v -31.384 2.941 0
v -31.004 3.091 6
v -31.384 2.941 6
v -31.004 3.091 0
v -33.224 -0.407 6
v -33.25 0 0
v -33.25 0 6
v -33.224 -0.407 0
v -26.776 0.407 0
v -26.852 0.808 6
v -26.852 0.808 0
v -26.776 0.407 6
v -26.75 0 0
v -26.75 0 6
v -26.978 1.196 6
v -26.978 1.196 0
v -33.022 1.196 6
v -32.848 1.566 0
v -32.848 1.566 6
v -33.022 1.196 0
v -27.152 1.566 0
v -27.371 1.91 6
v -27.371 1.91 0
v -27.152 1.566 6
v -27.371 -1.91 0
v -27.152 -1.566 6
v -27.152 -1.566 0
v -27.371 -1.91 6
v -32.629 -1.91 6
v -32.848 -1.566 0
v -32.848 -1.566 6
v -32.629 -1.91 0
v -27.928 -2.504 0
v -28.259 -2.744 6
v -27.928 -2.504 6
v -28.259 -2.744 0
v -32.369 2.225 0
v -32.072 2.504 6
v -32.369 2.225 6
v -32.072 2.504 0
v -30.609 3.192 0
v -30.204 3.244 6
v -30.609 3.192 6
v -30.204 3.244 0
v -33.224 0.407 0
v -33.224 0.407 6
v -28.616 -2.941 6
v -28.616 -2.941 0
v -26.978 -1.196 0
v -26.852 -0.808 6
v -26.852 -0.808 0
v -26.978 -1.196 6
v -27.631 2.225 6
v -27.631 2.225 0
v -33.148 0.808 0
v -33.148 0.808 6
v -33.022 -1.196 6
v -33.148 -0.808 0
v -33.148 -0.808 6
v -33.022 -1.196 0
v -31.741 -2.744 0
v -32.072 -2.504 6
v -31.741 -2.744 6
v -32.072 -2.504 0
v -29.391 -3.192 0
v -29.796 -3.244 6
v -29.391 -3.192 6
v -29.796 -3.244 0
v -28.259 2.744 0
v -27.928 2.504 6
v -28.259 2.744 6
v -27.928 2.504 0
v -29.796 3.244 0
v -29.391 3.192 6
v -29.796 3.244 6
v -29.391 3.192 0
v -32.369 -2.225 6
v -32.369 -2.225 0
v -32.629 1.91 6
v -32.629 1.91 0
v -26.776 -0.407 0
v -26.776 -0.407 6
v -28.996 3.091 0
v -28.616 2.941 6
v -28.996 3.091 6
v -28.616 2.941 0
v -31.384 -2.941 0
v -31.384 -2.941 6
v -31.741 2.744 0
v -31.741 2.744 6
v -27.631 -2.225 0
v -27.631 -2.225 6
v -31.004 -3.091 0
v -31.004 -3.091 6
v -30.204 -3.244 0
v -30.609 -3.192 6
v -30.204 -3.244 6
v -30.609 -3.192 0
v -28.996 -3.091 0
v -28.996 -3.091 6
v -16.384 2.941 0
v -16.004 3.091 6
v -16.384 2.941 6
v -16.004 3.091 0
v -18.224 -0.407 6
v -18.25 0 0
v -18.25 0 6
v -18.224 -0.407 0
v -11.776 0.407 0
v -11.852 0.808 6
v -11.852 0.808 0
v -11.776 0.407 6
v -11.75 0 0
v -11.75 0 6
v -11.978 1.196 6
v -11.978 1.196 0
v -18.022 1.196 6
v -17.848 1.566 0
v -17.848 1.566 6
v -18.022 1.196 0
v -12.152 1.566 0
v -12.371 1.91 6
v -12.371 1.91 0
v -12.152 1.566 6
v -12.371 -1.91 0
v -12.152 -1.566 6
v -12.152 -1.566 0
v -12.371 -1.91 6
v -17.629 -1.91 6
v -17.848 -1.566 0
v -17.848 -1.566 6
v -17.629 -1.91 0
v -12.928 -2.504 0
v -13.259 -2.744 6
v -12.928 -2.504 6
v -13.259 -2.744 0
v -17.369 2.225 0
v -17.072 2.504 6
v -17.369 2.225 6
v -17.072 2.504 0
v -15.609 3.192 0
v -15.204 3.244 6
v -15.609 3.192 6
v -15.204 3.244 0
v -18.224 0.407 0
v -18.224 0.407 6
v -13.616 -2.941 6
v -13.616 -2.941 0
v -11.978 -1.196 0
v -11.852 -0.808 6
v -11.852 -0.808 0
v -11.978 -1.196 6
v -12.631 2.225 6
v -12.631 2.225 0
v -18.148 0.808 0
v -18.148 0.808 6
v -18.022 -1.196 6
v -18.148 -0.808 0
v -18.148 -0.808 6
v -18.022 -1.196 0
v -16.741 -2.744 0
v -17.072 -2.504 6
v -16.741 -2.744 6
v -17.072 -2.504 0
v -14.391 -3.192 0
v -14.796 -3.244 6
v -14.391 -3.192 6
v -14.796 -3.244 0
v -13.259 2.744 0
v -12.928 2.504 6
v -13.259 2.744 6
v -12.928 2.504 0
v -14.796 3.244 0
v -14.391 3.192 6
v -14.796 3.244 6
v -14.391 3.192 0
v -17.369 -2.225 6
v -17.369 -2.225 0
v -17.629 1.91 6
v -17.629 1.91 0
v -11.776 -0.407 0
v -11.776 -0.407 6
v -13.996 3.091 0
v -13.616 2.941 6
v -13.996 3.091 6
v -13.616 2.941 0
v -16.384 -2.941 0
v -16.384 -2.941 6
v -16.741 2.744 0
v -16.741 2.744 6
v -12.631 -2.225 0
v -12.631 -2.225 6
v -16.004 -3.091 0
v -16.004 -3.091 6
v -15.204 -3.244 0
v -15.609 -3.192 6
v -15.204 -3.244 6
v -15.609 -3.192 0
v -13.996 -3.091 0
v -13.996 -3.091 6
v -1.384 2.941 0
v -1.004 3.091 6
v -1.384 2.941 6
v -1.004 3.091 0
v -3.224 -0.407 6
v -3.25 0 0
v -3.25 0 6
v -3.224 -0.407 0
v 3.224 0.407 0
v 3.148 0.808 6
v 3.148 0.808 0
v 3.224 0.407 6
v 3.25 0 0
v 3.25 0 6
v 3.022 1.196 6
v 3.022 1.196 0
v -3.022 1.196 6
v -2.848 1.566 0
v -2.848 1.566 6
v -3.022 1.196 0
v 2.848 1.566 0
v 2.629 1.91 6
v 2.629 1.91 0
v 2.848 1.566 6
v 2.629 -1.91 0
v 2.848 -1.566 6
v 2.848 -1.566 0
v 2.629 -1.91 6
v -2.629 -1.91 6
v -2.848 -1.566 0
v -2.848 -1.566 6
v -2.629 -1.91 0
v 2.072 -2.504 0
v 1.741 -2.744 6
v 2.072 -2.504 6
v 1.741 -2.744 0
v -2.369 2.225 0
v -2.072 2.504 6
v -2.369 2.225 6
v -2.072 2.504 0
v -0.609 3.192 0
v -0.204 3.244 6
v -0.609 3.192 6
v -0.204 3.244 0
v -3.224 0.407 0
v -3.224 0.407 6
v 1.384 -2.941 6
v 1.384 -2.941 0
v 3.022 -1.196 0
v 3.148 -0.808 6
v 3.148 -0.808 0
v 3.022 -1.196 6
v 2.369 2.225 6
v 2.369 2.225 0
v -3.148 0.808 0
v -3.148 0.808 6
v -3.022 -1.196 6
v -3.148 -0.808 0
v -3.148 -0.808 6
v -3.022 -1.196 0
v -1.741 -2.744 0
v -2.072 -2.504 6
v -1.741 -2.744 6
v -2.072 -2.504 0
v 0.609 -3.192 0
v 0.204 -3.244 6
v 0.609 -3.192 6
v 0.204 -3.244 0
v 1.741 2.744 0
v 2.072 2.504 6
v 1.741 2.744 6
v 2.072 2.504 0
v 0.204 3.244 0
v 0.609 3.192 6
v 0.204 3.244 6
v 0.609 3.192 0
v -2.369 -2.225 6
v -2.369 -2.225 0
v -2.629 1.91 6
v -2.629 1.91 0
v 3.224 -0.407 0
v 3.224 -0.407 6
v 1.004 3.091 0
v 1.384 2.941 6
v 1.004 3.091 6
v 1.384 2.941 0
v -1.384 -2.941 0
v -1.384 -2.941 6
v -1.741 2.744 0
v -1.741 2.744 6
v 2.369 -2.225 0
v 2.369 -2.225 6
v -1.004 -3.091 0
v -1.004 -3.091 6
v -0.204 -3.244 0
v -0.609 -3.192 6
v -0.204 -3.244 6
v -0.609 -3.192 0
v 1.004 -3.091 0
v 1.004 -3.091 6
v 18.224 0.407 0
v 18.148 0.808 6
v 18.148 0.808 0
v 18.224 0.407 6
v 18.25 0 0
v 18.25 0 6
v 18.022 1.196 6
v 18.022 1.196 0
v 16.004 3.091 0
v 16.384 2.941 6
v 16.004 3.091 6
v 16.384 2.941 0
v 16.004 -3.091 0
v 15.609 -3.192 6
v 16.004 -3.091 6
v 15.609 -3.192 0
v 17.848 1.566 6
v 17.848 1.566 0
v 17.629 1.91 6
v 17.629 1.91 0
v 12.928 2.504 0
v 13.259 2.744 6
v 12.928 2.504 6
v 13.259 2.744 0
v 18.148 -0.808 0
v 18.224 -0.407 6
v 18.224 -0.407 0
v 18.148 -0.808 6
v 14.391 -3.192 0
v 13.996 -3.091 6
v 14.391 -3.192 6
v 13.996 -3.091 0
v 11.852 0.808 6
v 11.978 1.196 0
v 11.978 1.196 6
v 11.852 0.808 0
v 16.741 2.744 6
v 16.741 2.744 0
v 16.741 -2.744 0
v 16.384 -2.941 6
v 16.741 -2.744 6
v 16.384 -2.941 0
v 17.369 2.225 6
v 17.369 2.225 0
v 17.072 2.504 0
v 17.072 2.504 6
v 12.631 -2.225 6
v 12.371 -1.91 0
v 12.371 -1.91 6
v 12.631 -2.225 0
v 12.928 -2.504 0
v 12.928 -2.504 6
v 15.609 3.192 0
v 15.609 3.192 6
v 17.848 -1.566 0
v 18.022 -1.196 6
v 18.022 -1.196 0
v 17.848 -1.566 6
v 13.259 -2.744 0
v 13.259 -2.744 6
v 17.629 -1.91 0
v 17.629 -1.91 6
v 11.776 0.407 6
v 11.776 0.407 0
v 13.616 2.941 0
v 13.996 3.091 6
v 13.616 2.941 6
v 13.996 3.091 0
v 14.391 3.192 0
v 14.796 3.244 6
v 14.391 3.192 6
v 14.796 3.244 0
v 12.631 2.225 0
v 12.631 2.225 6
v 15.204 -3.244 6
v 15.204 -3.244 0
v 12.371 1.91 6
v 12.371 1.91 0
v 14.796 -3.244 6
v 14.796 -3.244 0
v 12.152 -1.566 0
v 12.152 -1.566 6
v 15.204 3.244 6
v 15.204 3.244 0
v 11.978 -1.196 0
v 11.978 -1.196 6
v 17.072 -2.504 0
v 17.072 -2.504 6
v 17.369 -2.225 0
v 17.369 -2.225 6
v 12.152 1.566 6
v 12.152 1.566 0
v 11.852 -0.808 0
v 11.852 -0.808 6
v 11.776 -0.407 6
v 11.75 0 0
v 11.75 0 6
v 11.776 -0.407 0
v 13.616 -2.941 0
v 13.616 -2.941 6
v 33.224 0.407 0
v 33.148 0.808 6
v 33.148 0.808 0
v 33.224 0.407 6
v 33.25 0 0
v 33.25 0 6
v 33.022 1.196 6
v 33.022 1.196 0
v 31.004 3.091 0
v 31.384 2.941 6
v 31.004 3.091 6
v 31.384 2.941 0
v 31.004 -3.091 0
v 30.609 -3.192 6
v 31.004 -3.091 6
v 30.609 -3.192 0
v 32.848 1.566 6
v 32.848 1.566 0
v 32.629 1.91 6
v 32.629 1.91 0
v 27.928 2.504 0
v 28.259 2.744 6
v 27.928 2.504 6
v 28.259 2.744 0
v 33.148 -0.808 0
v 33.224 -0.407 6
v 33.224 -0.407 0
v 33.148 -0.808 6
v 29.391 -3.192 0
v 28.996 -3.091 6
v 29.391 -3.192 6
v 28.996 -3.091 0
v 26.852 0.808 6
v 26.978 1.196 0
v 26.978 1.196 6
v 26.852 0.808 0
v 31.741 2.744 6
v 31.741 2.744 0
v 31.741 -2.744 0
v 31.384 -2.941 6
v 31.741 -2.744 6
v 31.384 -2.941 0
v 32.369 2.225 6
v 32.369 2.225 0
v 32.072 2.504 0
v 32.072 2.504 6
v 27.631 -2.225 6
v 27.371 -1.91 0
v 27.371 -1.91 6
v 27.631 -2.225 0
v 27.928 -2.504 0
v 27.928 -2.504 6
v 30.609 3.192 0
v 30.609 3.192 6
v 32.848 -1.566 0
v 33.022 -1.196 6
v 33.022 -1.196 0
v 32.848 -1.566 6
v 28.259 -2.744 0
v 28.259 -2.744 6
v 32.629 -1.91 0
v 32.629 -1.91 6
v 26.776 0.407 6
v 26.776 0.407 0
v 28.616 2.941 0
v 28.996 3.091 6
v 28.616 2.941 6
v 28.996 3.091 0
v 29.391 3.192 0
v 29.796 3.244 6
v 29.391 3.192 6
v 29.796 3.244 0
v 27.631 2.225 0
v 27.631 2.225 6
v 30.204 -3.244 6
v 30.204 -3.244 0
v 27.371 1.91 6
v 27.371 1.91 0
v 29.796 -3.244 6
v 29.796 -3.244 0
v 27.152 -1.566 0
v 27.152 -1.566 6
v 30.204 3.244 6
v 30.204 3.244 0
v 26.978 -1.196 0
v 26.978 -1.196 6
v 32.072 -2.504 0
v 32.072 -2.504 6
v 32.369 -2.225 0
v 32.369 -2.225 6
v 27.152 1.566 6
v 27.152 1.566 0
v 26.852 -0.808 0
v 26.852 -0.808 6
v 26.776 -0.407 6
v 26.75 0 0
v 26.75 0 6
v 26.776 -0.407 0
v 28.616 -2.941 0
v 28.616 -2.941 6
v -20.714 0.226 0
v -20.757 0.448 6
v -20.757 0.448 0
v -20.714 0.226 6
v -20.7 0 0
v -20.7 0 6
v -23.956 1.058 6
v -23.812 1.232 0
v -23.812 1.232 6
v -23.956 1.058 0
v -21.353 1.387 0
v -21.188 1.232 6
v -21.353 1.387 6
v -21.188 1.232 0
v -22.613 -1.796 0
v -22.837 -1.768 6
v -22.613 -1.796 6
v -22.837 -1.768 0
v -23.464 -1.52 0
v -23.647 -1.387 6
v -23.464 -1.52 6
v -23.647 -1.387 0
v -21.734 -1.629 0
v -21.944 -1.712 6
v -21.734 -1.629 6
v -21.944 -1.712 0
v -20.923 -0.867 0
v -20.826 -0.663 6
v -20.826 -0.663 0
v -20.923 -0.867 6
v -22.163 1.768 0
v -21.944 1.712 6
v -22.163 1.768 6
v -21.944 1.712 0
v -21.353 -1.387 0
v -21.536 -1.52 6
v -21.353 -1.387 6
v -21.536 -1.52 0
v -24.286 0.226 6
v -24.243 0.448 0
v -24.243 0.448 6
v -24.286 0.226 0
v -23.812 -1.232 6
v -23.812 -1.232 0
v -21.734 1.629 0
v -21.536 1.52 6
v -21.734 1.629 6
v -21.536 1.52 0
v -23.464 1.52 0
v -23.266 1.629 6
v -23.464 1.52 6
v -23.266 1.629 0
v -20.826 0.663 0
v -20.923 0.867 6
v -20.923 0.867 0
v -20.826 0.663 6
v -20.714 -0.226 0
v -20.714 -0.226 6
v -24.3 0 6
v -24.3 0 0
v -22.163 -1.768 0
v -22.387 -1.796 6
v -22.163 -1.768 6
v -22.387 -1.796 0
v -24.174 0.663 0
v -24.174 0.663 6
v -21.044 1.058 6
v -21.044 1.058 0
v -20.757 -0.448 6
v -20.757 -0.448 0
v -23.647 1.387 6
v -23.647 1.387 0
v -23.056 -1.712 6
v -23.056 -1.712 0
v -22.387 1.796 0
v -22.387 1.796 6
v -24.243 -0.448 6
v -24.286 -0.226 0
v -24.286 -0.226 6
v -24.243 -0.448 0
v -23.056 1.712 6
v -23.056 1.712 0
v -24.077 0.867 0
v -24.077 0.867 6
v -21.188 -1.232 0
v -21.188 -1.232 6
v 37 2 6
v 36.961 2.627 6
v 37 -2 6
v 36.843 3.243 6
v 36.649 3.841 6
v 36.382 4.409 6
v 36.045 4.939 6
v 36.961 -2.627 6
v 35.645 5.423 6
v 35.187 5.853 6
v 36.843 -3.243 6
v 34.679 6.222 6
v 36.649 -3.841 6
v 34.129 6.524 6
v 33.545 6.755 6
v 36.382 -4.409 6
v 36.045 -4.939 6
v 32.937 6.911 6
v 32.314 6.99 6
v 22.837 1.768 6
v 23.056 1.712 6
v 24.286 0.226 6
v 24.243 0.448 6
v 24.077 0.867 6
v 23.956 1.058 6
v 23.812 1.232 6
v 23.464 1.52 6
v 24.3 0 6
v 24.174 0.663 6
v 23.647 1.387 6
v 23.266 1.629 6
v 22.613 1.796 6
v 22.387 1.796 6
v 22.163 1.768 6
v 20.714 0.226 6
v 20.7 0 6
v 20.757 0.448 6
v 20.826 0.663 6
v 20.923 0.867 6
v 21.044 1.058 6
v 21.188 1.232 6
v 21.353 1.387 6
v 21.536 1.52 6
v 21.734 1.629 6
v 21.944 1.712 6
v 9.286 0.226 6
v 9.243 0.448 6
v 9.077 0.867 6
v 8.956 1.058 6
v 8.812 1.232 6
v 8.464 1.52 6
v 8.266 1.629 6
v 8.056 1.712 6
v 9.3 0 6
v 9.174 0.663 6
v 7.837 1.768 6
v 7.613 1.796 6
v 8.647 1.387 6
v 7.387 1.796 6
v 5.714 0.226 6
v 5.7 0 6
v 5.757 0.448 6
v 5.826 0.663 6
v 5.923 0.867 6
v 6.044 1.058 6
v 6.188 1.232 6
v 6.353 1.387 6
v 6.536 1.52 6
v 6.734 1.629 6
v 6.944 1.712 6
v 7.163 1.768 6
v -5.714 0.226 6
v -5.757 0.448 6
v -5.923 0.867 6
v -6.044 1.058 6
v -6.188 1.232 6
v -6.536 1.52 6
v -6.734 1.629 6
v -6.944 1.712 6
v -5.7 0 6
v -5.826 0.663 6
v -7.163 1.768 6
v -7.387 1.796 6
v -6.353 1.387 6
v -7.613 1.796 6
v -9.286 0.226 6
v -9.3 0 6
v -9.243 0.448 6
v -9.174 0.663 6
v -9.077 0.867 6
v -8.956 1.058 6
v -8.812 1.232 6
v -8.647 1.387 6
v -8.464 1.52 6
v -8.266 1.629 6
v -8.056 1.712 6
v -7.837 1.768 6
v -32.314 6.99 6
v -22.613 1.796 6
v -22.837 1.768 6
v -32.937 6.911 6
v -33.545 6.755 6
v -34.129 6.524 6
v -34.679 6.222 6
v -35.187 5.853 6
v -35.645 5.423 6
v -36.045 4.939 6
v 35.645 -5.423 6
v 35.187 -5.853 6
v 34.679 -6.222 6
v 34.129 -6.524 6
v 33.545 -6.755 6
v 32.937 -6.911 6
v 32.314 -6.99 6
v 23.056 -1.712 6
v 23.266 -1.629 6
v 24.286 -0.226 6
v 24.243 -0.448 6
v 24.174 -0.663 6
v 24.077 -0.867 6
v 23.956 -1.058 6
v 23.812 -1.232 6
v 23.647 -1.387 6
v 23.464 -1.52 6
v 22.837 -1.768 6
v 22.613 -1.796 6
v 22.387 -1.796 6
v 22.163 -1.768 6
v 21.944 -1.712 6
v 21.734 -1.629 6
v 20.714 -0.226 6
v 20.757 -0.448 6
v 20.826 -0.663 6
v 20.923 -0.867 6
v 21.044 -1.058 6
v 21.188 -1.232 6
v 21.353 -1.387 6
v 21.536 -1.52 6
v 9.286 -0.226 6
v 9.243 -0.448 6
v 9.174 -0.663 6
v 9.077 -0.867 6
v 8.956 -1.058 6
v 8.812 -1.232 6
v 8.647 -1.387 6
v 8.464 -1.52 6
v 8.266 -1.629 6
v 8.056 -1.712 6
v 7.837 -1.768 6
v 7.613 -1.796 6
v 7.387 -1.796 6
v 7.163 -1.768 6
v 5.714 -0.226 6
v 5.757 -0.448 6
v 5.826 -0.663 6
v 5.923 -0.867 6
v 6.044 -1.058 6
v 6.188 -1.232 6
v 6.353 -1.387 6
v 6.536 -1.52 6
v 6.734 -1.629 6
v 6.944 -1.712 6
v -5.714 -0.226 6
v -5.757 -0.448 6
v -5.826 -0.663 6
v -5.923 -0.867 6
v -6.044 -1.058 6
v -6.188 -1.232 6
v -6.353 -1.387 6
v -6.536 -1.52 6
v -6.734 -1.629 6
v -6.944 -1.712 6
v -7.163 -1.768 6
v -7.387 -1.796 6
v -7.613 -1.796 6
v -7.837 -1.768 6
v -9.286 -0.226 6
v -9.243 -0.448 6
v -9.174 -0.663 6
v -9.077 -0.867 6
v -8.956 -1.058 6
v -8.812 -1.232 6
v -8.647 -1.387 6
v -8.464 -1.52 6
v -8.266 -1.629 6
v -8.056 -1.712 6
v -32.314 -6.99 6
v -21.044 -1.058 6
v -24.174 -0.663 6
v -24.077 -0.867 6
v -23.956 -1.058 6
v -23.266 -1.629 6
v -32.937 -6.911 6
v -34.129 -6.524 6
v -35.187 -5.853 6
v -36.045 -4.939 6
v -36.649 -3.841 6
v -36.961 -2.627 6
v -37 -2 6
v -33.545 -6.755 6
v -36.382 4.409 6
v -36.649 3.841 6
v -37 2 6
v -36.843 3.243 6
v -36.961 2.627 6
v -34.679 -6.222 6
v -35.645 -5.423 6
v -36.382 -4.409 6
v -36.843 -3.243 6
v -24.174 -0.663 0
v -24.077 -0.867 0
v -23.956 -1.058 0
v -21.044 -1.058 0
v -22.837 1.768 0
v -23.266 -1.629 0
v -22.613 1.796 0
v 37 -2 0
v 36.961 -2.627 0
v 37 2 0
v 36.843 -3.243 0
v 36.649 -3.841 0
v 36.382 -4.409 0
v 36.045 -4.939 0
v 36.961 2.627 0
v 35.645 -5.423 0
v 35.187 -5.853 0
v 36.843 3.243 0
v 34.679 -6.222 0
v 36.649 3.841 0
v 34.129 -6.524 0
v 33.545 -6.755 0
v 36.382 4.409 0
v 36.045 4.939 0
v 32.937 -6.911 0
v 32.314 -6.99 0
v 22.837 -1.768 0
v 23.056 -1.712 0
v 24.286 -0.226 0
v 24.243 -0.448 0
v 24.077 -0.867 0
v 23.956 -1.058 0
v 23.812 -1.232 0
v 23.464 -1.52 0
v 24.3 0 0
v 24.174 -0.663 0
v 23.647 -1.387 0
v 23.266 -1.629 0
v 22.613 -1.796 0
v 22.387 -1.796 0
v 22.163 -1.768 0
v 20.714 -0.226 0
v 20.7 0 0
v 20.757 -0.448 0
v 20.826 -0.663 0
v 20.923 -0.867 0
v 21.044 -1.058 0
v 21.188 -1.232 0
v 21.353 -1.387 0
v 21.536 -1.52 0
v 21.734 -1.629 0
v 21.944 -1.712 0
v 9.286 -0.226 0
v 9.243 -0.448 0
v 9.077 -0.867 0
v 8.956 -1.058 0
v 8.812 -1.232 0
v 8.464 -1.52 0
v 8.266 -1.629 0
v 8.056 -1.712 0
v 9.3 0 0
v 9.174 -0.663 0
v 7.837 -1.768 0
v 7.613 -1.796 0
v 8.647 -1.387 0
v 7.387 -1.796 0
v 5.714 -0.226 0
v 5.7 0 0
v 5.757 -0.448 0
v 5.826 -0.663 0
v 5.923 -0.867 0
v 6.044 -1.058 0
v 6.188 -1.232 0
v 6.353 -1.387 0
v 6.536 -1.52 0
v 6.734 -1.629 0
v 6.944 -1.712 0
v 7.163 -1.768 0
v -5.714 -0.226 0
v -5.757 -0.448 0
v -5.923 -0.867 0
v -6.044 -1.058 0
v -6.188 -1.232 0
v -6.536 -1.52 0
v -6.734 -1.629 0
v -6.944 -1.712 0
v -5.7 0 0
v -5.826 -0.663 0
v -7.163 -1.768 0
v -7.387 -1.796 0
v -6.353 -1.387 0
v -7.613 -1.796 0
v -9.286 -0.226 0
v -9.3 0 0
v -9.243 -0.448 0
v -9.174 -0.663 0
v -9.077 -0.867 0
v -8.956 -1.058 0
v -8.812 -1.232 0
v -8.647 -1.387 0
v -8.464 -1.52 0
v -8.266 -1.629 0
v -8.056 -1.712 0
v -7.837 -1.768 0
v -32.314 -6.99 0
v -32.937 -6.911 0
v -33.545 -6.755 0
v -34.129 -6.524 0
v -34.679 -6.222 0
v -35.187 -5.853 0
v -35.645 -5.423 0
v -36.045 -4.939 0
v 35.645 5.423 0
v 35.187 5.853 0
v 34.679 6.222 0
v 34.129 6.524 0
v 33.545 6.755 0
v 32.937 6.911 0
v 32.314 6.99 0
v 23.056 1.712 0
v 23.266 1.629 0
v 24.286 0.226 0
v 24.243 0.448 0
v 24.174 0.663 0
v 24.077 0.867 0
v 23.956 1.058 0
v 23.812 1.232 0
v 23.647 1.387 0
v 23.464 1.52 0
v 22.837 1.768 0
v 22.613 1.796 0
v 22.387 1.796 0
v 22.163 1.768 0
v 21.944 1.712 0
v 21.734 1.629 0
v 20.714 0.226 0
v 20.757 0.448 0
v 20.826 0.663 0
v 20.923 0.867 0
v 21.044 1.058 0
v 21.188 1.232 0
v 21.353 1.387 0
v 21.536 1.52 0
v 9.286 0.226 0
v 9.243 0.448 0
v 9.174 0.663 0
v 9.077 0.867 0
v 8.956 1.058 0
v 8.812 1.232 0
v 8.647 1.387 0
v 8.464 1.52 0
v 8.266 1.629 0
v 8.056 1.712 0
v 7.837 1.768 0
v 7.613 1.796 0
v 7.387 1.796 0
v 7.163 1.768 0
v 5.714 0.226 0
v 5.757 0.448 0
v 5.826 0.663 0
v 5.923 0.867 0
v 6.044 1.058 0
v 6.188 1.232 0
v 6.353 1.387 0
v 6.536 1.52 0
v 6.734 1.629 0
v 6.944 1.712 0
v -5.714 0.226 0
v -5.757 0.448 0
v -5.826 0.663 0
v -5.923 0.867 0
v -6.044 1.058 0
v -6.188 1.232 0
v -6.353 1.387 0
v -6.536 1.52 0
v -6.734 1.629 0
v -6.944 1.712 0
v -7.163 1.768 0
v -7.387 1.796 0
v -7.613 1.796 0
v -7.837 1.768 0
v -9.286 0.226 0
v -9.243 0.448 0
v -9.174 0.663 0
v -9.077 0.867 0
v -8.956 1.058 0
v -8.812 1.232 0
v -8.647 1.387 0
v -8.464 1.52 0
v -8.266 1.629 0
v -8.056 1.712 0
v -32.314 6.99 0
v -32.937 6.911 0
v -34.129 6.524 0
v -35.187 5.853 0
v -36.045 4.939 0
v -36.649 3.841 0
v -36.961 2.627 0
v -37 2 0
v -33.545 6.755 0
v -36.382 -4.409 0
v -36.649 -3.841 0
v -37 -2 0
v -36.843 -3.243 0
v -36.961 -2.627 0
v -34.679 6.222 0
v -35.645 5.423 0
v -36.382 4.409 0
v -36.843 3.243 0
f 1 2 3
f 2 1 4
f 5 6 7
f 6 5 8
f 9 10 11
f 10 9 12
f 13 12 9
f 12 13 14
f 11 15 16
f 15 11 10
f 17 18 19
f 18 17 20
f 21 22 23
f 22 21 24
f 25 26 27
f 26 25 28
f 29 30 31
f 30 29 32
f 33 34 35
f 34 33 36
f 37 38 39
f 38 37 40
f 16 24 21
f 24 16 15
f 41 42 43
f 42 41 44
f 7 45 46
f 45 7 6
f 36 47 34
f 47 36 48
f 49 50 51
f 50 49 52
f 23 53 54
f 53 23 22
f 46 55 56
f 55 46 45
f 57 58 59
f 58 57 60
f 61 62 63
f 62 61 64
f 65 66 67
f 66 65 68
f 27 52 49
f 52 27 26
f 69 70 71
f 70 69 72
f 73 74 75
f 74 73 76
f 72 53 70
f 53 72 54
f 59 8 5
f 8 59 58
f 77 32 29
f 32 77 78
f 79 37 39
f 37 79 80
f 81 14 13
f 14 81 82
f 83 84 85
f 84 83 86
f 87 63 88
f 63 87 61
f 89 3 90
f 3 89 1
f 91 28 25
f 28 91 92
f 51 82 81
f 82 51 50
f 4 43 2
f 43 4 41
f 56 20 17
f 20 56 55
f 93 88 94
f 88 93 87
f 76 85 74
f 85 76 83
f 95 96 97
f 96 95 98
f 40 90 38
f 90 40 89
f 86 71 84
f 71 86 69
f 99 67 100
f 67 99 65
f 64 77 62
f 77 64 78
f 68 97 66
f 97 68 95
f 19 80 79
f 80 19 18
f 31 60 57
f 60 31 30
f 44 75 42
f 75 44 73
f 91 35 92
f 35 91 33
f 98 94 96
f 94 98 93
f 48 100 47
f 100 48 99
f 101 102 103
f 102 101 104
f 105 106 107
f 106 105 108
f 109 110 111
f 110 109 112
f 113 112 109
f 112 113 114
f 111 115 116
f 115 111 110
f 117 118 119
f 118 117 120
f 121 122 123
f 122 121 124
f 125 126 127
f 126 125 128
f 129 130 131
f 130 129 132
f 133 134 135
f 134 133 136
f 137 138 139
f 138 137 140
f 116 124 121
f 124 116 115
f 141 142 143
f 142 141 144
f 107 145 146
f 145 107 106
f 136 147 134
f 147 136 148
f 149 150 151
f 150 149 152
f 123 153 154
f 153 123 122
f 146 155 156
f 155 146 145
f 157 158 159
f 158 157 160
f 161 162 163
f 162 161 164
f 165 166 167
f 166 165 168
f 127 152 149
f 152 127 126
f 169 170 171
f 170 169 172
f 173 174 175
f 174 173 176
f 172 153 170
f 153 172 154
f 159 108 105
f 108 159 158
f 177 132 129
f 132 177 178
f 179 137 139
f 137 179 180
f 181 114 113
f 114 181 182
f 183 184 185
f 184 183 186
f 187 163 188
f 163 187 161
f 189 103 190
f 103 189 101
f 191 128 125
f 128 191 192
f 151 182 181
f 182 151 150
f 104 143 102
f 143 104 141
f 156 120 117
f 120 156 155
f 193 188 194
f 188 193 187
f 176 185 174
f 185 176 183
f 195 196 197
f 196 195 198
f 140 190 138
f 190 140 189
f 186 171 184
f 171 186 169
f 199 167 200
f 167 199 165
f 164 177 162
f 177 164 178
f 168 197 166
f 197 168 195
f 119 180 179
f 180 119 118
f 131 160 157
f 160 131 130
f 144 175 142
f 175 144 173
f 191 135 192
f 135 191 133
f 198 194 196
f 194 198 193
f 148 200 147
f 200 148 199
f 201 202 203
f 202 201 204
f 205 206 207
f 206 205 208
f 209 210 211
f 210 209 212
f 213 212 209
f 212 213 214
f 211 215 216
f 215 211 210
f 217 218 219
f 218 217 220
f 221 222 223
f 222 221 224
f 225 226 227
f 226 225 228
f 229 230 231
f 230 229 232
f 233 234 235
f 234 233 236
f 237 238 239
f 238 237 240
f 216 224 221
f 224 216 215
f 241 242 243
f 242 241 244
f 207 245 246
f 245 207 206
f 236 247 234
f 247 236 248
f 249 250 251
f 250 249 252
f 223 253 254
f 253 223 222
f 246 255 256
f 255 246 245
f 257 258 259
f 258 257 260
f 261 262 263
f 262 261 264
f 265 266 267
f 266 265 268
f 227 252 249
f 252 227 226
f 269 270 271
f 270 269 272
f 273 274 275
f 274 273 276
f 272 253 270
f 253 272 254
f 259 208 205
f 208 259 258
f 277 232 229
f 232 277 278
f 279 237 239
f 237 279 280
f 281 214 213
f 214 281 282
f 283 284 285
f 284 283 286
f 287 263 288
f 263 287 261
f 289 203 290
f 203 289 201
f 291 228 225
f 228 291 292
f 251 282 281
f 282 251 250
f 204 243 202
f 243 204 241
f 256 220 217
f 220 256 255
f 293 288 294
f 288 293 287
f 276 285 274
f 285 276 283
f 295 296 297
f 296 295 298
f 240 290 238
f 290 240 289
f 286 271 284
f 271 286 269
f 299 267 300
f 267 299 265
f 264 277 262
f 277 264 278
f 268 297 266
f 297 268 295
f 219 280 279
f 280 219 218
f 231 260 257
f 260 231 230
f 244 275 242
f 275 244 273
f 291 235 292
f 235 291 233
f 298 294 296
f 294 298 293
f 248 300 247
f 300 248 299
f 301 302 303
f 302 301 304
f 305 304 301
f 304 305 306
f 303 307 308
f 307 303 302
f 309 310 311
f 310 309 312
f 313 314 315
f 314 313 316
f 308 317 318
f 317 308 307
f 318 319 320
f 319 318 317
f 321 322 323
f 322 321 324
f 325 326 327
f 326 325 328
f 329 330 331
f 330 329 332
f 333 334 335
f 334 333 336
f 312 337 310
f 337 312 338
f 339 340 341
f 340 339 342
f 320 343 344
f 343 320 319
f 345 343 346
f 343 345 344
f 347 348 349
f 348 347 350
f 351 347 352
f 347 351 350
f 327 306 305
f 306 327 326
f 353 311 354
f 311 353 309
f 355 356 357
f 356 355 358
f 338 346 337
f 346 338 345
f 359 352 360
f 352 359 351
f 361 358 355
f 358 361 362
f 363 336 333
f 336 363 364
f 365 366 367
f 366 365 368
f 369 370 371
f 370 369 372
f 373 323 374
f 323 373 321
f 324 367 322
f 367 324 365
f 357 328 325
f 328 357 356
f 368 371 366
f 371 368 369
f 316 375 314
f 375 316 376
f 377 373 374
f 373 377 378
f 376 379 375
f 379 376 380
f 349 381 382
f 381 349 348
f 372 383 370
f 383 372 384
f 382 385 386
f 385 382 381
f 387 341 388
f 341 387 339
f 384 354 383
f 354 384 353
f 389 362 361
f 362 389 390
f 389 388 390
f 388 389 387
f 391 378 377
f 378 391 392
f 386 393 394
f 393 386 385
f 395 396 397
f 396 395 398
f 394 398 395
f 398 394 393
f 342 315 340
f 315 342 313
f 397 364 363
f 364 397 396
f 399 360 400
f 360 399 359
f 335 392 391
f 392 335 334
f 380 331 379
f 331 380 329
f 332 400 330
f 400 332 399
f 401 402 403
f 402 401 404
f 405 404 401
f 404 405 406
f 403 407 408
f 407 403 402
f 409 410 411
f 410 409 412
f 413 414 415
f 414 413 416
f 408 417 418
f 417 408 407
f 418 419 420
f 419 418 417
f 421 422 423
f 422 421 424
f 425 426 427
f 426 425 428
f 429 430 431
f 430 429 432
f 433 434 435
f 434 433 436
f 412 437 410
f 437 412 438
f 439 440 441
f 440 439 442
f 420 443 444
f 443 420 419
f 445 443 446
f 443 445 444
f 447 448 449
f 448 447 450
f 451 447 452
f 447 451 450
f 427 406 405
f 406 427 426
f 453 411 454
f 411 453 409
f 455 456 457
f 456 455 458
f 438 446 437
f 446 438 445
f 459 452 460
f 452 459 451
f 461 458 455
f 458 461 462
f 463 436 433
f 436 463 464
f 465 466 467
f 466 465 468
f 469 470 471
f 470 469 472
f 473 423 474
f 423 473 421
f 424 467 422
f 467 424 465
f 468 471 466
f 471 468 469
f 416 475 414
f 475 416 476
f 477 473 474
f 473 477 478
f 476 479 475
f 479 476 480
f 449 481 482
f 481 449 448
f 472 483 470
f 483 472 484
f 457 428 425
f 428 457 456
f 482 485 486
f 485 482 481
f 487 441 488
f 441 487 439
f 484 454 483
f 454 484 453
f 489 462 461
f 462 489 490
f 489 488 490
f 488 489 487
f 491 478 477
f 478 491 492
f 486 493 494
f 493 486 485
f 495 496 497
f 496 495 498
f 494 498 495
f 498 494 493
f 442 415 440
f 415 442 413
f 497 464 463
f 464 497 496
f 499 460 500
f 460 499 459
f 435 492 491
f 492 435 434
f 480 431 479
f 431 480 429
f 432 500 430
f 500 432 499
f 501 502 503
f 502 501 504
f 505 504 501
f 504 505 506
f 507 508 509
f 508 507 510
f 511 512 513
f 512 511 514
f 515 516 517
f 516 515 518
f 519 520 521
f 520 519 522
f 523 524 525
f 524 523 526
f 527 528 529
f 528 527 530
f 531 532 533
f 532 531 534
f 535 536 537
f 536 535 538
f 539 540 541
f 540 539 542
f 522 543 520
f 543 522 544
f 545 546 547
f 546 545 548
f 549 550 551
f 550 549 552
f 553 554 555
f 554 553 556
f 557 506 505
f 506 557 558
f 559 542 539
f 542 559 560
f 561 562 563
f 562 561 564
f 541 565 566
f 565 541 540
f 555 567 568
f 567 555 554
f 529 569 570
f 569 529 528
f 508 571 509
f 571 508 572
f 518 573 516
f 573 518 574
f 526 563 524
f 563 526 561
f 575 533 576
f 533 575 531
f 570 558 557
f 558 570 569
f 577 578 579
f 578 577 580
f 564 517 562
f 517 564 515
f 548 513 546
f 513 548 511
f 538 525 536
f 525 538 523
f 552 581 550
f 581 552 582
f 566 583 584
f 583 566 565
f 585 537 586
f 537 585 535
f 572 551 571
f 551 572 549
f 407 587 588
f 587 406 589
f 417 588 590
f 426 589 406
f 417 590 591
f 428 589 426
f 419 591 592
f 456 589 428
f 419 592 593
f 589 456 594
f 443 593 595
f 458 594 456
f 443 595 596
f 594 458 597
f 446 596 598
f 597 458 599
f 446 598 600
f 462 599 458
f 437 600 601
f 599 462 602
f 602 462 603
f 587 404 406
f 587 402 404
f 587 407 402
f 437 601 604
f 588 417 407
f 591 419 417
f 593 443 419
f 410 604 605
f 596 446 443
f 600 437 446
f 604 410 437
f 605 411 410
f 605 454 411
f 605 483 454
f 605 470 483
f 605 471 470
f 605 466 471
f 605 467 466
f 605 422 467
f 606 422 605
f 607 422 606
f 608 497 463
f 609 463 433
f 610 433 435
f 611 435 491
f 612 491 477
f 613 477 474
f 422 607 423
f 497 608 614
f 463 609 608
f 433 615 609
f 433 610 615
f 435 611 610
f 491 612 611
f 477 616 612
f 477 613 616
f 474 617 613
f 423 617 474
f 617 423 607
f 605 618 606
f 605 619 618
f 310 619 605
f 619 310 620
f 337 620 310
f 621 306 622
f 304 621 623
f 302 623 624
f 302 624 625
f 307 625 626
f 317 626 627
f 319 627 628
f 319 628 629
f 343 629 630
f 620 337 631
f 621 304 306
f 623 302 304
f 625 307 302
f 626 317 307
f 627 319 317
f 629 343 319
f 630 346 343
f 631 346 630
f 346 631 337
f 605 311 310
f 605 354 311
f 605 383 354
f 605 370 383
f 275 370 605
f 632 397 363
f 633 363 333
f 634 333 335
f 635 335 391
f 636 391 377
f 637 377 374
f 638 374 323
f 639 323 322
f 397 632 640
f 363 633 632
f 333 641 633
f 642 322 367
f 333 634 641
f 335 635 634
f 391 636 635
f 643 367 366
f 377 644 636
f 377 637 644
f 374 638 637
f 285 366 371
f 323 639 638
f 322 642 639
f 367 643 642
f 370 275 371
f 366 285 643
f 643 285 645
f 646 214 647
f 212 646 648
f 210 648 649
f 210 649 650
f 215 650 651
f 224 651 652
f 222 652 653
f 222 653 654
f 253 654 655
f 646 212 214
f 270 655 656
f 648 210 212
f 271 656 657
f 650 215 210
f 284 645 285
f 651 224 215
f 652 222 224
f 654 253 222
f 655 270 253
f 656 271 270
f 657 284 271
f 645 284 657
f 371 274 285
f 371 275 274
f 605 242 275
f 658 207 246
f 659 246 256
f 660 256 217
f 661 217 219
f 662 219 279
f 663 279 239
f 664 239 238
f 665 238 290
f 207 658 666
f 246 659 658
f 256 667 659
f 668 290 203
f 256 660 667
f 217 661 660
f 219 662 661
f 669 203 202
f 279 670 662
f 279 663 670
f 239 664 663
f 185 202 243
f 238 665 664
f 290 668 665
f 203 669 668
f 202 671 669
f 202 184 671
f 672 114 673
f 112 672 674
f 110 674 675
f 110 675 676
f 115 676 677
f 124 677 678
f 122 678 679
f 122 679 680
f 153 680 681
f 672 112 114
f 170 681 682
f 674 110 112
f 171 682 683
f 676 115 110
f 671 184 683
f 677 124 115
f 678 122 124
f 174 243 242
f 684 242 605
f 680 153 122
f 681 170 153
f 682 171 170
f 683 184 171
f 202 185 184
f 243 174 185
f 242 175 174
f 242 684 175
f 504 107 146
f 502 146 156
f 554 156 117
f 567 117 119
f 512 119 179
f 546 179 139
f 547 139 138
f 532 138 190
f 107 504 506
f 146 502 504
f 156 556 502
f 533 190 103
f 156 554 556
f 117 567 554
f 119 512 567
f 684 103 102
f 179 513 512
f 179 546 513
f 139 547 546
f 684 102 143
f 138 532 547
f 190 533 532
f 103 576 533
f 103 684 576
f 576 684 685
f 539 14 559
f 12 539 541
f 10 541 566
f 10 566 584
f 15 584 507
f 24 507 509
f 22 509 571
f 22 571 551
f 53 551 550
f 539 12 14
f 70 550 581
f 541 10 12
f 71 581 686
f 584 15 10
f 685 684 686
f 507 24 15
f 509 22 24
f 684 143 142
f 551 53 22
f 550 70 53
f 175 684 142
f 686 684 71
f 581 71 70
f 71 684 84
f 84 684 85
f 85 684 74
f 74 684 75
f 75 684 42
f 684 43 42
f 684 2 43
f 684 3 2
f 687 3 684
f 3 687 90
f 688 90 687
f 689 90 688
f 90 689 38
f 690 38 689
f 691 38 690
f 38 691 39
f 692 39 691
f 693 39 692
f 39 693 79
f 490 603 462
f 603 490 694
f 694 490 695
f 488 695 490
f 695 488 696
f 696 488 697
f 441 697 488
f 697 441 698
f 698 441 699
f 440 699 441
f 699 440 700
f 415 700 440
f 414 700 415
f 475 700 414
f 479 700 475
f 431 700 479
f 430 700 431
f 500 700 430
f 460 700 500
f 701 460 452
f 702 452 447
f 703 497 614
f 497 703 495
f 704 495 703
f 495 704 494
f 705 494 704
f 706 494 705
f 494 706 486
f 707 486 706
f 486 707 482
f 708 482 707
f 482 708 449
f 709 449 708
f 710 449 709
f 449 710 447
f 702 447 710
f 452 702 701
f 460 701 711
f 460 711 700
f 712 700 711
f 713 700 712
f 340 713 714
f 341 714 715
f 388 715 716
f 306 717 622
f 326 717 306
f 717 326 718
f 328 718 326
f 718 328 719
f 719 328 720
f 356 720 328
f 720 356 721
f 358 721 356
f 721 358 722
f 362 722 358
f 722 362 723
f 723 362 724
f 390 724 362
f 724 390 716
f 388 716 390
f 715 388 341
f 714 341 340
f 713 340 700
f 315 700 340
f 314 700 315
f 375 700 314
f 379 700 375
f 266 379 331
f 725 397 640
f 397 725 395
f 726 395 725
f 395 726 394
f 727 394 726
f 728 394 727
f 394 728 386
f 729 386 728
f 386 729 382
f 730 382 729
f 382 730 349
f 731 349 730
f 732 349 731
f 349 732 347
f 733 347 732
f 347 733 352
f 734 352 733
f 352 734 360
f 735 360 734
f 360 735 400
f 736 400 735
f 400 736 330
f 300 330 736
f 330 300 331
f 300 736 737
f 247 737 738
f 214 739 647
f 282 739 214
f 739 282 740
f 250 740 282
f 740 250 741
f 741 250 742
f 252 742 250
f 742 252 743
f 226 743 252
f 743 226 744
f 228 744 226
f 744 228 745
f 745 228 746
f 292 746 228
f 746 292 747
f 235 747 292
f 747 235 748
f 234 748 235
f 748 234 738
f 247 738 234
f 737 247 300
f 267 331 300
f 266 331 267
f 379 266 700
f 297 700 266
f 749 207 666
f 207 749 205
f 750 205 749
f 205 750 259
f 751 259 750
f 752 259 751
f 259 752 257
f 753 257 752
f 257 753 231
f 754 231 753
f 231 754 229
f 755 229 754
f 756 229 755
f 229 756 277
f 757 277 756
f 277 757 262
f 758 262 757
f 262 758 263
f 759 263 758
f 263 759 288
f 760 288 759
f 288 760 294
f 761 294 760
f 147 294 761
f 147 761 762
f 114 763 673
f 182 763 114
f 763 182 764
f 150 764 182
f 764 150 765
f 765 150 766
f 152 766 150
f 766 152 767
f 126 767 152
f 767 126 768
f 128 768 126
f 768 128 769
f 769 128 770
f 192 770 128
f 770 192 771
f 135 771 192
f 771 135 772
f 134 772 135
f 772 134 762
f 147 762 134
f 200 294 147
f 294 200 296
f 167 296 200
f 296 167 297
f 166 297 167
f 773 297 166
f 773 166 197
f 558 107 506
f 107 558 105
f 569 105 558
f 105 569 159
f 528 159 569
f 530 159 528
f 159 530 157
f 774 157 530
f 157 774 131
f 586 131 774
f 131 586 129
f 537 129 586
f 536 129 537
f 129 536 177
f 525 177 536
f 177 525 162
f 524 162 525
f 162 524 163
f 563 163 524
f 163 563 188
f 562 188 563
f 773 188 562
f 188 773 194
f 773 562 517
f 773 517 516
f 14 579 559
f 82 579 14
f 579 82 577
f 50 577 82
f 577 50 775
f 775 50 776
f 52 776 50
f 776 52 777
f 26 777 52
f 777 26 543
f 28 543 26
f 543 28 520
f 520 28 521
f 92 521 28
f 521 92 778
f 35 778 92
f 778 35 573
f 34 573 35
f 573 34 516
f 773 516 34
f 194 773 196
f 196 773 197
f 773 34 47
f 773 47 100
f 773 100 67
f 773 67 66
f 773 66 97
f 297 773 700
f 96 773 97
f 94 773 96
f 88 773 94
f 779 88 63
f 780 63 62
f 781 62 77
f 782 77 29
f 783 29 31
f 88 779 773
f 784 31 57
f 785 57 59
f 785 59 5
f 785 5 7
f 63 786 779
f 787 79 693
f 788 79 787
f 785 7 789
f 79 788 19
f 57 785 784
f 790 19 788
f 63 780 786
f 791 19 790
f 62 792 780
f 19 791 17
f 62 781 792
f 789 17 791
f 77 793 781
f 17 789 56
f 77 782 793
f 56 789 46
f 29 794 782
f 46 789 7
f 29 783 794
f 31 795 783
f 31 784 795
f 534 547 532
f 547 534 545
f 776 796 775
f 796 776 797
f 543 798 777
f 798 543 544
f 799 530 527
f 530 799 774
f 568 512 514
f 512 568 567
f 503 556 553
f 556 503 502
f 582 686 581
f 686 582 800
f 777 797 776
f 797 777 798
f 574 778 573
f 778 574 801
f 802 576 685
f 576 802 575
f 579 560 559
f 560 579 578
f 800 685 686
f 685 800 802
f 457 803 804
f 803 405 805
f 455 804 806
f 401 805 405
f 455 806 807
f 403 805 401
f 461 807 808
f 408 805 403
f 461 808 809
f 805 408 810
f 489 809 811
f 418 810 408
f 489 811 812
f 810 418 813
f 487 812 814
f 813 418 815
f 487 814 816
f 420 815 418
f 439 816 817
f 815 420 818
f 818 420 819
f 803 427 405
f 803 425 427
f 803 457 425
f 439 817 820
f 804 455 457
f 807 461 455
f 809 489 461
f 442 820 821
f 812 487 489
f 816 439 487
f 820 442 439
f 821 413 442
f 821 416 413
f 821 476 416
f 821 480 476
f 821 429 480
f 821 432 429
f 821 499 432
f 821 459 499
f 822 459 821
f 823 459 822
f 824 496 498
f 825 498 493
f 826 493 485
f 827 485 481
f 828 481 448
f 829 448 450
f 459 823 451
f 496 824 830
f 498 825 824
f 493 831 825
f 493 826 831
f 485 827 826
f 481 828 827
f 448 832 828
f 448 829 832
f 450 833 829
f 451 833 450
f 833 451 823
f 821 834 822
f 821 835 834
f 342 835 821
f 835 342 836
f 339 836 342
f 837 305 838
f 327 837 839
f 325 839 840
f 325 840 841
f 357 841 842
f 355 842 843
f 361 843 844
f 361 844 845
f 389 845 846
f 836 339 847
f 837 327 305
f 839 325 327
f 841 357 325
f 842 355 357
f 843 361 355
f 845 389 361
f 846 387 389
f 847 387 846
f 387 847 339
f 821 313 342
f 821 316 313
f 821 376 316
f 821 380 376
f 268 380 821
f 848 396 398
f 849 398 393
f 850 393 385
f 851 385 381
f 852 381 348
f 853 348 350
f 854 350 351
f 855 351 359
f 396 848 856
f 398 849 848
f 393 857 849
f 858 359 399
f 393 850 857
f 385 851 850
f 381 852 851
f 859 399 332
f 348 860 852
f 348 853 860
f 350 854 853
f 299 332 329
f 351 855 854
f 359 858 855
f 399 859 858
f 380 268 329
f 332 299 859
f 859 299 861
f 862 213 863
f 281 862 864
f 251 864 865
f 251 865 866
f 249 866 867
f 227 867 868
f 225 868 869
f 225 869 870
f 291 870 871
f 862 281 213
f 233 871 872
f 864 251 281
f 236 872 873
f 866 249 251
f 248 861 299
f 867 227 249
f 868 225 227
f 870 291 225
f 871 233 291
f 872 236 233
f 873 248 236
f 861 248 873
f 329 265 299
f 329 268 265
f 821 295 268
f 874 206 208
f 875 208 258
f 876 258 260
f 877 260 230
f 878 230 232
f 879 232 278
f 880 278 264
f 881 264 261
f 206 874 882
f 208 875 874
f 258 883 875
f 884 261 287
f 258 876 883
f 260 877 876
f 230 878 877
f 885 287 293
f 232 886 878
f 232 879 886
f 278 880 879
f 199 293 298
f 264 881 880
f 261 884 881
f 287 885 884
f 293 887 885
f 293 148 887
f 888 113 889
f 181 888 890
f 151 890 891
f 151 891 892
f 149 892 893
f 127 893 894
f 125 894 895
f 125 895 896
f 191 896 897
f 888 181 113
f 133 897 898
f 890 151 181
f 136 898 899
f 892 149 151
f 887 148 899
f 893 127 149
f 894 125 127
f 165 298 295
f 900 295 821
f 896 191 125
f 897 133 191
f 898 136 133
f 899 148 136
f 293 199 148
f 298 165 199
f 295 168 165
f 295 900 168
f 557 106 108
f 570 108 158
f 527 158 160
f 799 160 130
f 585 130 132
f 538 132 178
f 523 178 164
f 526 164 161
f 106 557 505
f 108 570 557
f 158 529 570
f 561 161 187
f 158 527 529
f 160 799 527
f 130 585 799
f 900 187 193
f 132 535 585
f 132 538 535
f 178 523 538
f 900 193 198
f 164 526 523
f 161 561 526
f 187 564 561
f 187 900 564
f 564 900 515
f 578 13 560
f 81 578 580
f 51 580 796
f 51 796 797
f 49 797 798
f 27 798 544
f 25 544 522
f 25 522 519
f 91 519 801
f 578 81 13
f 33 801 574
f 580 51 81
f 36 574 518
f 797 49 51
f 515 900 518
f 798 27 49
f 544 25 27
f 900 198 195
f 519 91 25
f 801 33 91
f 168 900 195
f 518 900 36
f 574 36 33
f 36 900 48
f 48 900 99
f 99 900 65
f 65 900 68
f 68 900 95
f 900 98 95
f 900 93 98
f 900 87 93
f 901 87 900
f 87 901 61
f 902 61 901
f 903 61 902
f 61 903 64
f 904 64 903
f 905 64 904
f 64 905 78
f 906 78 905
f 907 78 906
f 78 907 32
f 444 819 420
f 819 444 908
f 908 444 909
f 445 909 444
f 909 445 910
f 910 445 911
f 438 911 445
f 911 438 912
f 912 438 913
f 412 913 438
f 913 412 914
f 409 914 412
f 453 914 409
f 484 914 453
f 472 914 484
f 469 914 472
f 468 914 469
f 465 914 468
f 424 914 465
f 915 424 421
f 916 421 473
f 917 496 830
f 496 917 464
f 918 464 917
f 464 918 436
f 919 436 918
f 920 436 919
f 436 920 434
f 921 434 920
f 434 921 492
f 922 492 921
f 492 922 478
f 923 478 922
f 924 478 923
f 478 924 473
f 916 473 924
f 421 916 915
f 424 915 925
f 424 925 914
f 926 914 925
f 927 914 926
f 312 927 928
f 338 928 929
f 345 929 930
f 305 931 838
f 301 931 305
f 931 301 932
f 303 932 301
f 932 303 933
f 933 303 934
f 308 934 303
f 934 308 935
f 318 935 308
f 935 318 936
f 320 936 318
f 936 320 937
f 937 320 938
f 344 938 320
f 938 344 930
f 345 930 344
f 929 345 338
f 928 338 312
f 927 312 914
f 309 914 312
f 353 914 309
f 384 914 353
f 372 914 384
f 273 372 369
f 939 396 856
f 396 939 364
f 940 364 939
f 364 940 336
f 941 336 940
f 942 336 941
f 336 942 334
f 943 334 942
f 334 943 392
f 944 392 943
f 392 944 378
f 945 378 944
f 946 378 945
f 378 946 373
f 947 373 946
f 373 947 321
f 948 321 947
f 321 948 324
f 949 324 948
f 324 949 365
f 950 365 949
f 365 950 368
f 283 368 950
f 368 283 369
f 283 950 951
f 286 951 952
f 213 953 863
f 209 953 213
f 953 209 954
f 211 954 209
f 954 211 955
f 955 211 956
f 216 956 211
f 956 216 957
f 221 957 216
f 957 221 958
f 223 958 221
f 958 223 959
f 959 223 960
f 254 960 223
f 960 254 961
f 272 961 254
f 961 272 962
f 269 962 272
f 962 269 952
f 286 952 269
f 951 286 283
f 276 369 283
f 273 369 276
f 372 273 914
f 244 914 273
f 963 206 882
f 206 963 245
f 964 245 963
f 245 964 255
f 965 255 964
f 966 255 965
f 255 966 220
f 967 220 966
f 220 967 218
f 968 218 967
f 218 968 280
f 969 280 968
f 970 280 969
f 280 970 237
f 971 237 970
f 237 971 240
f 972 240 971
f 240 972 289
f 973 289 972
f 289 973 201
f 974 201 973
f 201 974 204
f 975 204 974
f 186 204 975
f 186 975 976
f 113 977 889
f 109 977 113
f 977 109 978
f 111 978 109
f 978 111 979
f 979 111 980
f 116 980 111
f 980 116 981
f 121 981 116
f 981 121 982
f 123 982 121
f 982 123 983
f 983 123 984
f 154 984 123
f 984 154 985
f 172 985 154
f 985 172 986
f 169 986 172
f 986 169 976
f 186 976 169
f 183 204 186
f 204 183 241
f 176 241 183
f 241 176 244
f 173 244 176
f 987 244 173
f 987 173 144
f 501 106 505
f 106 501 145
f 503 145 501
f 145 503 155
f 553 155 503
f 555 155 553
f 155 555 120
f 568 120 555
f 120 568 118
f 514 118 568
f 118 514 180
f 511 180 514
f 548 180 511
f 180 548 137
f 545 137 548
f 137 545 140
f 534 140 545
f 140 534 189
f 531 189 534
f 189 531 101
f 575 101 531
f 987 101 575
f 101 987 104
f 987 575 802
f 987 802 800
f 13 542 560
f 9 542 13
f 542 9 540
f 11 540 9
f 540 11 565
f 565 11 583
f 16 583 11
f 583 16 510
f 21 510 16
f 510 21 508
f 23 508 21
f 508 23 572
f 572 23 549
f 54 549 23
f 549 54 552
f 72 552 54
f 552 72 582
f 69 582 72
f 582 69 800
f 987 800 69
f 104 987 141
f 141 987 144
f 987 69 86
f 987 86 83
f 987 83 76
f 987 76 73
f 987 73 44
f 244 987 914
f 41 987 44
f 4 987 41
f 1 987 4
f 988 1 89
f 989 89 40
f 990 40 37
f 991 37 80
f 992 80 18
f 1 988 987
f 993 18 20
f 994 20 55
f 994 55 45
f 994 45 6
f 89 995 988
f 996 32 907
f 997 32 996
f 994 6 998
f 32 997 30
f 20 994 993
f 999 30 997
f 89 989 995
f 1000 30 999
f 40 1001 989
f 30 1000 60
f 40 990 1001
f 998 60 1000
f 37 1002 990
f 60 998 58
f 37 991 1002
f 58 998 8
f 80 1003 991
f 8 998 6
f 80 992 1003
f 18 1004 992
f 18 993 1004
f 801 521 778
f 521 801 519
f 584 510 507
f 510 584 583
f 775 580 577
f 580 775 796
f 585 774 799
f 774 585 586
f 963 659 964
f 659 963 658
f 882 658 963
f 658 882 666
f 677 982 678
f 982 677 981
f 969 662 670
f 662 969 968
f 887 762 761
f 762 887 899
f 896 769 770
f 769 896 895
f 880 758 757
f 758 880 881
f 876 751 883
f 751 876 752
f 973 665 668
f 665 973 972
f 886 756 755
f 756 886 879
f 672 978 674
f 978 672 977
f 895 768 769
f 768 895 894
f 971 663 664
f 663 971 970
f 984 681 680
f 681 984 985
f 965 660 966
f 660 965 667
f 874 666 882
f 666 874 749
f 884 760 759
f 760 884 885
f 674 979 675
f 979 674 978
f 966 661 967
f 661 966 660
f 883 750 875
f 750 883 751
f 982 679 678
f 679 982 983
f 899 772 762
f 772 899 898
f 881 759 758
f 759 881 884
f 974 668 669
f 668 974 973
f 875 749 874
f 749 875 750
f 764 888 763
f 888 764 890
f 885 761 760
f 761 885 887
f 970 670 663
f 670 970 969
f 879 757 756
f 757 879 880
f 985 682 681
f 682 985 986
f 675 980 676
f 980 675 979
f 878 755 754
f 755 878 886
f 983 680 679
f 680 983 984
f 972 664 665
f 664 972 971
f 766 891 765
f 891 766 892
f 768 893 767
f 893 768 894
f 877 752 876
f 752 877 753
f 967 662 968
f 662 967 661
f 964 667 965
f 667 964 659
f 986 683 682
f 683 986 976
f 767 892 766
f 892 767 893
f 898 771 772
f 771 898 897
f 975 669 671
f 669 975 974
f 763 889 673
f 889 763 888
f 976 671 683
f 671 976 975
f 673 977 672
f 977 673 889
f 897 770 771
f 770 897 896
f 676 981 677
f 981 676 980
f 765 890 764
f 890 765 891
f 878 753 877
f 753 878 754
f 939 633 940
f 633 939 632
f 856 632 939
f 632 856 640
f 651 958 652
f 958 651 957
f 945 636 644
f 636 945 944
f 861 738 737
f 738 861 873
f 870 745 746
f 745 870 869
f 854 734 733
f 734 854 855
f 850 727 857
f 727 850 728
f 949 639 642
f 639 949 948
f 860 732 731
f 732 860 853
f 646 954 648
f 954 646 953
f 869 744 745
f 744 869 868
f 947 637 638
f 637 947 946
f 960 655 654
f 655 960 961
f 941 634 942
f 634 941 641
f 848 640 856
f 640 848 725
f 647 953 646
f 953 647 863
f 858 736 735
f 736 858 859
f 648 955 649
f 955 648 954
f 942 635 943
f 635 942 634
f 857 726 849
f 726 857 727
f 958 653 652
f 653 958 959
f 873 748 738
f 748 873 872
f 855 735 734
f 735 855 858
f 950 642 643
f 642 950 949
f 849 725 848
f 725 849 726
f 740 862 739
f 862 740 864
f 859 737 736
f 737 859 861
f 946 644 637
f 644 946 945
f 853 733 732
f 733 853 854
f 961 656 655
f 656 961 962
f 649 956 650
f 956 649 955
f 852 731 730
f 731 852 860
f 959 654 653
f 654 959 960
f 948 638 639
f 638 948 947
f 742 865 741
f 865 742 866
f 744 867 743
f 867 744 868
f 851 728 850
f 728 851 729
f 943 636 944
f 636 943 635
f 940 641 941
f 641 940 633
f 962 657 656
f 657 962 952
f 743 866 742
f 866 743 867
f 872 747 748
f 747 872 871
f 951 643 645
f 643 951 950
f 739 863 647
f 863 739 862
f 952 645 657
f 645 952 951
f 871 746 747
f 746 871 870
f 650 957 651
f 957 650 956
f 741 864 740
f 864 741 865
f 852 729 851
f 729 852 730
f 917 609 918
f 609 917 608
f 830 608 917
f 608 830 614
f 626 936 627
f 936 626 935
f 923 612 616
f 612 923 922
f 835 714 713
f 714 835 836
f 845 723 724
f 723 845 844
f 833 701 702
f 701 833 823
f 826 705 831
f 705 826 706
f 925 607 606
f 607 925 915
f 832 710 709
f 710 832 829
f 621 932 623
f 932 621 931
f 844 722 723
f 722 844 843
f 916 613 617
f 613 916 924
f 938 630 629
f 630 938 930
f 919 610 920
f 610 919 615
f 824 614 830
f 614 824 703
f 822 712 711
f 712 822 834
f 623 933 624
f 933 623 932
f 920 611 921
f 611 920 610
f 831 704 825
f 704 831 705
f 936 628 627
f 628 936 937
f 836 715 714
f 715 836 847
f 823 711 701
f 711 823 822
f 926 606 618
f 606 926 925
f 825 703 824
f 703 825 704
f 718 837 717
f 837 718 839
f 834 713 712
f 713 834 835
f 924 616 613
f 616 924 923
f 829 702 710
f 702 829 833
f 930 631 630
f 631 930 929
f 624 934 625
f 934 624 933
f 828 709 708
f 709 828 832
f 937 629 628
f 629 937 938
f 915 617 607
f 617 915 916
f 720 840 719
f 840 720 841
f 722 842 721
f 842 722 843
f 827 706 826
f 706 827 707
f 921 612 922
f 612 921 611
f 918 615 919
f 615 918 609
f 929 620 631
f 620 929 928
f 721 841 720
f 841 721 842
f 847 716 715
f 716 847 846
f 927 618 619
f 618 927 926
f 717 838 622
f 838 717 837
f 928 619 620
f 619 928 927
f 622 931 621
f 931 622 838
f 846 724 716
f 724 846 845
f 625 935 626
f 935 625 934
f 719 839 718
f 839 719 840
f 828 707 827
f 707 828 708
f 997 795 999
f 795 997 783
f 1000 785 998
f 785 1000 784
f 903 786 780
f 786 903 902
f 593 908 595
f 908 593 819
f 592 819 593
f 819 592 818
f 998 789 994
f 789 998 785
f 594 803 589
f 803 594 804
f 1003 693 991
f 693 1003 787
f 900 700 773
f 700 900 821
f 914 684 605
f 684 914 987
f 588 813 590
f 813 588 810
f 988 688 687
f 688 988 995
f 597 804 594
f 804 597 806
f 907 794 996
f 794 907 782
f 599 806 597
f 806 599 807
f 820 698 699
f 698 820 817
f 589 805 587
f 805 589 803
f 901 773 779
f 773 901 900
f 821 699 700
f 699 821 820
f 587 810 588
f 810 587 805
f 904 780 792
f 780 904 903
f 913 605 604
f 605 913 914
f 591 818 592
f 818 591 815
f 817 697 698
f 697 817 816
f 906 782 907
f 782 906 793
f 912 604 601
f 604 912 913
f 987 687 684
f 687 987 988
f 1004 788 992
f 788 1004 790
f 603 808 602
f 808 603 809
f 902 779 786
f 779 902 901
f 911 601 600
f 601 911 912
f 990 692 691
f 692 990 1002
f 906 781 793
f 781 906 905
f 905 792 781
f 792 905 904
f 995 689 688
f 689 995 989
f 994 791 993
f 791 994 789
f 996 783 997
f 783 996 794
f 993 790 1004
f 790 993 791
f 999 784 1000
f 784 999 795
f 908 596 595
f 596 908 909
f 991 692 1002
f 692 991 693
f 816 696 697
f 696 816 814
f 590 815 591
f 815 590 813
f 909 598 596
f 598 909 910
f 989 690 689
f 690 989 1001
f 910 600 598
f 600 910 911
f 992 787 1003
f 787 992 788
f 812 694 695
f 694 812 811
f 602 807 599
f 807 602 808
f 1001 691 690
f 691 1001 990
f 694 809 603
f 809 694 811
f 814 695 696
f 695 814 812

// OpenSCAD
$fn = 50;


difference() {
	union() {
		hull() {
			translate(v = [-32.0000000000, 2.0000000000, 0]) {
				cylinder(h = 6, r = 5);
			}
			translate(v = [32.0000000000, 2.0000000000, 0]) {
				cylinder(h = 6, r = 5);
			}
			translate(v = [-32.0000000000, -2.0000000000, 0]) {
				cylinder(h = 6, r = 5);
			}
			translate(v = [32.0000000000, -2.0000000000, 0]) {
				cylinder(h = 6, r = 5);
			}
		}
	}
	union() {
		translate(v = [-30.0000000000, 0.0000000000, -100.0000000000]) {
			cylinder(h = 200, r = 3.2500000000);
		}
		translate(v = [-15.0000000000, 0.0000000000, -100.0000000000]) {
			cylinder(h = 200, r = 3.2500000000);
		}
		translate(v = [0.0000000000, 0.0000000000, -100.0000000000]) {
			cylinder(h = 200, r = 3.2500000000);
		}
		translate(v = [15.0000000000, 0.0000000000, -100.0000000000]) {
			cylinder(h = 200, r = 3.2500000000);
		}
		translate(v = [30.0000000000, 0.0000000000, -100.0000000000]) {
			cylinder(h = 200, r = 3.2500000000);
		}
		translate(v = [-30.0000000000, 0.0000000000, 0]) {
			cylinder(h = 6, r = 1.8000000000);
		}
		translate(v = [-22.5000000000, 0.0000000000, 0]) {
			cylinder(h = 6, r = 1.8000000000);
		}
		translate(v = [-15.0000000000, 0.0000000000, 0]) {
			cylinder(h = 6, r = 1.8000000000);
		}
		translate(v = [-7.5000000000, 0.0000000000, 0]) {
			cylinder(h = 6, r = 1.8000000000);
		}
		cylinder(h = 6, r = 1.8000000000);
		translate(v = [7.5000000000, 0.0000000000, 0]) {
			cylinder(h = 6, r = 1.8000000000);
		}
		translate(v = [15.0000000000, 0.0000000000, 0]) {
			cylinder(h = 6, r = 1.8000000000);
		}
		translate(v = [22.5000000000, 0.0000000000, 0]) {
			cylinder(h = 6, r = 1.8000000000);
		}
		translate(v = [30.0000000000, 0.0000000000, 0]) {
			cylinder(h = 6, r = 1.8000000000);
		}
		translate(v = [-30.0000000000, 0.0000000000, 0]) {
			cylinder(h = 6, r = 1.8000000000);
		}
		translate(v = [-22.5000000000, 0.0000000000, 0]) {
			cylinder(h = 6, r = 1.8000000000);
		}
		translate(v = [-15.0000000000, 0.0000000000, 0]) {
			cylinder(h = 6, r = 1.8000000000);
		}
		translate(v = [-7.5000000000, 0.0000000000, 0]) {
			cylinder(h = 6, r = 1.8000000000);
		}
		cylinder(h = 6, r = 1.8000000000);
		translate(v = [7.5000000000, 0.0000000000, 0]) {
			cylinder(h = 6, r = 1.8000000000);
		}
		translate(v = [15.0000000000, 0.0000000000, 0]) {
			cylinder(h = 6, r = 1.8000000000);
		}
		translate(v = [22.5000000000, 0.0000000000, 0]) {
			cylinder(h = 6, r = 1.8000000000);
		}
		translate(v = [30.0000000000, 0.0000000000, 0]) {
			cylinder(h = 6, r = 1.8000000000);
		}
		translate(v = [-30.0000000000, 0.0000000000, 0]) {
			cylinder(h = 6, r = 1.8000000000);
		}
		translate(v = [-22.5000000000, 0.0000000000, 0]) {
			cylinder(h = 6, r = 1.8000000000);
		}
		translate(v = [-15.0000000000, 0.0000000000, 0]) {
			cylinder(h = 6, r = 1.8000000000);
		}
		translate(v = [-7.5000000000, 0.0000000000, 0]) {
			cylinder(h = 6, r = 1.8000000000);
		}
		cylinder(h = 6, r = 1.8000000000);
		translate(v = [7.5000000000, 0.0000000000, 0]) {
			cylinder(h = 6, r = 1.8000000000);
		}
		translate(v = [15.0000000000, 0.0000000000, 0]) {
			cylinder(h = 6, r = 1.8000000000);
		}
		translate(v = [22.5000000000, 0.0000000000, 0]) {
			cylinder(h = 6, r = 1.8000000000);
		}
		translate(v = [30.0000000000, 0.0000000000, 0]) {
			cylinder(h = 6, r = 1.8000000000);
		}
	}
}
